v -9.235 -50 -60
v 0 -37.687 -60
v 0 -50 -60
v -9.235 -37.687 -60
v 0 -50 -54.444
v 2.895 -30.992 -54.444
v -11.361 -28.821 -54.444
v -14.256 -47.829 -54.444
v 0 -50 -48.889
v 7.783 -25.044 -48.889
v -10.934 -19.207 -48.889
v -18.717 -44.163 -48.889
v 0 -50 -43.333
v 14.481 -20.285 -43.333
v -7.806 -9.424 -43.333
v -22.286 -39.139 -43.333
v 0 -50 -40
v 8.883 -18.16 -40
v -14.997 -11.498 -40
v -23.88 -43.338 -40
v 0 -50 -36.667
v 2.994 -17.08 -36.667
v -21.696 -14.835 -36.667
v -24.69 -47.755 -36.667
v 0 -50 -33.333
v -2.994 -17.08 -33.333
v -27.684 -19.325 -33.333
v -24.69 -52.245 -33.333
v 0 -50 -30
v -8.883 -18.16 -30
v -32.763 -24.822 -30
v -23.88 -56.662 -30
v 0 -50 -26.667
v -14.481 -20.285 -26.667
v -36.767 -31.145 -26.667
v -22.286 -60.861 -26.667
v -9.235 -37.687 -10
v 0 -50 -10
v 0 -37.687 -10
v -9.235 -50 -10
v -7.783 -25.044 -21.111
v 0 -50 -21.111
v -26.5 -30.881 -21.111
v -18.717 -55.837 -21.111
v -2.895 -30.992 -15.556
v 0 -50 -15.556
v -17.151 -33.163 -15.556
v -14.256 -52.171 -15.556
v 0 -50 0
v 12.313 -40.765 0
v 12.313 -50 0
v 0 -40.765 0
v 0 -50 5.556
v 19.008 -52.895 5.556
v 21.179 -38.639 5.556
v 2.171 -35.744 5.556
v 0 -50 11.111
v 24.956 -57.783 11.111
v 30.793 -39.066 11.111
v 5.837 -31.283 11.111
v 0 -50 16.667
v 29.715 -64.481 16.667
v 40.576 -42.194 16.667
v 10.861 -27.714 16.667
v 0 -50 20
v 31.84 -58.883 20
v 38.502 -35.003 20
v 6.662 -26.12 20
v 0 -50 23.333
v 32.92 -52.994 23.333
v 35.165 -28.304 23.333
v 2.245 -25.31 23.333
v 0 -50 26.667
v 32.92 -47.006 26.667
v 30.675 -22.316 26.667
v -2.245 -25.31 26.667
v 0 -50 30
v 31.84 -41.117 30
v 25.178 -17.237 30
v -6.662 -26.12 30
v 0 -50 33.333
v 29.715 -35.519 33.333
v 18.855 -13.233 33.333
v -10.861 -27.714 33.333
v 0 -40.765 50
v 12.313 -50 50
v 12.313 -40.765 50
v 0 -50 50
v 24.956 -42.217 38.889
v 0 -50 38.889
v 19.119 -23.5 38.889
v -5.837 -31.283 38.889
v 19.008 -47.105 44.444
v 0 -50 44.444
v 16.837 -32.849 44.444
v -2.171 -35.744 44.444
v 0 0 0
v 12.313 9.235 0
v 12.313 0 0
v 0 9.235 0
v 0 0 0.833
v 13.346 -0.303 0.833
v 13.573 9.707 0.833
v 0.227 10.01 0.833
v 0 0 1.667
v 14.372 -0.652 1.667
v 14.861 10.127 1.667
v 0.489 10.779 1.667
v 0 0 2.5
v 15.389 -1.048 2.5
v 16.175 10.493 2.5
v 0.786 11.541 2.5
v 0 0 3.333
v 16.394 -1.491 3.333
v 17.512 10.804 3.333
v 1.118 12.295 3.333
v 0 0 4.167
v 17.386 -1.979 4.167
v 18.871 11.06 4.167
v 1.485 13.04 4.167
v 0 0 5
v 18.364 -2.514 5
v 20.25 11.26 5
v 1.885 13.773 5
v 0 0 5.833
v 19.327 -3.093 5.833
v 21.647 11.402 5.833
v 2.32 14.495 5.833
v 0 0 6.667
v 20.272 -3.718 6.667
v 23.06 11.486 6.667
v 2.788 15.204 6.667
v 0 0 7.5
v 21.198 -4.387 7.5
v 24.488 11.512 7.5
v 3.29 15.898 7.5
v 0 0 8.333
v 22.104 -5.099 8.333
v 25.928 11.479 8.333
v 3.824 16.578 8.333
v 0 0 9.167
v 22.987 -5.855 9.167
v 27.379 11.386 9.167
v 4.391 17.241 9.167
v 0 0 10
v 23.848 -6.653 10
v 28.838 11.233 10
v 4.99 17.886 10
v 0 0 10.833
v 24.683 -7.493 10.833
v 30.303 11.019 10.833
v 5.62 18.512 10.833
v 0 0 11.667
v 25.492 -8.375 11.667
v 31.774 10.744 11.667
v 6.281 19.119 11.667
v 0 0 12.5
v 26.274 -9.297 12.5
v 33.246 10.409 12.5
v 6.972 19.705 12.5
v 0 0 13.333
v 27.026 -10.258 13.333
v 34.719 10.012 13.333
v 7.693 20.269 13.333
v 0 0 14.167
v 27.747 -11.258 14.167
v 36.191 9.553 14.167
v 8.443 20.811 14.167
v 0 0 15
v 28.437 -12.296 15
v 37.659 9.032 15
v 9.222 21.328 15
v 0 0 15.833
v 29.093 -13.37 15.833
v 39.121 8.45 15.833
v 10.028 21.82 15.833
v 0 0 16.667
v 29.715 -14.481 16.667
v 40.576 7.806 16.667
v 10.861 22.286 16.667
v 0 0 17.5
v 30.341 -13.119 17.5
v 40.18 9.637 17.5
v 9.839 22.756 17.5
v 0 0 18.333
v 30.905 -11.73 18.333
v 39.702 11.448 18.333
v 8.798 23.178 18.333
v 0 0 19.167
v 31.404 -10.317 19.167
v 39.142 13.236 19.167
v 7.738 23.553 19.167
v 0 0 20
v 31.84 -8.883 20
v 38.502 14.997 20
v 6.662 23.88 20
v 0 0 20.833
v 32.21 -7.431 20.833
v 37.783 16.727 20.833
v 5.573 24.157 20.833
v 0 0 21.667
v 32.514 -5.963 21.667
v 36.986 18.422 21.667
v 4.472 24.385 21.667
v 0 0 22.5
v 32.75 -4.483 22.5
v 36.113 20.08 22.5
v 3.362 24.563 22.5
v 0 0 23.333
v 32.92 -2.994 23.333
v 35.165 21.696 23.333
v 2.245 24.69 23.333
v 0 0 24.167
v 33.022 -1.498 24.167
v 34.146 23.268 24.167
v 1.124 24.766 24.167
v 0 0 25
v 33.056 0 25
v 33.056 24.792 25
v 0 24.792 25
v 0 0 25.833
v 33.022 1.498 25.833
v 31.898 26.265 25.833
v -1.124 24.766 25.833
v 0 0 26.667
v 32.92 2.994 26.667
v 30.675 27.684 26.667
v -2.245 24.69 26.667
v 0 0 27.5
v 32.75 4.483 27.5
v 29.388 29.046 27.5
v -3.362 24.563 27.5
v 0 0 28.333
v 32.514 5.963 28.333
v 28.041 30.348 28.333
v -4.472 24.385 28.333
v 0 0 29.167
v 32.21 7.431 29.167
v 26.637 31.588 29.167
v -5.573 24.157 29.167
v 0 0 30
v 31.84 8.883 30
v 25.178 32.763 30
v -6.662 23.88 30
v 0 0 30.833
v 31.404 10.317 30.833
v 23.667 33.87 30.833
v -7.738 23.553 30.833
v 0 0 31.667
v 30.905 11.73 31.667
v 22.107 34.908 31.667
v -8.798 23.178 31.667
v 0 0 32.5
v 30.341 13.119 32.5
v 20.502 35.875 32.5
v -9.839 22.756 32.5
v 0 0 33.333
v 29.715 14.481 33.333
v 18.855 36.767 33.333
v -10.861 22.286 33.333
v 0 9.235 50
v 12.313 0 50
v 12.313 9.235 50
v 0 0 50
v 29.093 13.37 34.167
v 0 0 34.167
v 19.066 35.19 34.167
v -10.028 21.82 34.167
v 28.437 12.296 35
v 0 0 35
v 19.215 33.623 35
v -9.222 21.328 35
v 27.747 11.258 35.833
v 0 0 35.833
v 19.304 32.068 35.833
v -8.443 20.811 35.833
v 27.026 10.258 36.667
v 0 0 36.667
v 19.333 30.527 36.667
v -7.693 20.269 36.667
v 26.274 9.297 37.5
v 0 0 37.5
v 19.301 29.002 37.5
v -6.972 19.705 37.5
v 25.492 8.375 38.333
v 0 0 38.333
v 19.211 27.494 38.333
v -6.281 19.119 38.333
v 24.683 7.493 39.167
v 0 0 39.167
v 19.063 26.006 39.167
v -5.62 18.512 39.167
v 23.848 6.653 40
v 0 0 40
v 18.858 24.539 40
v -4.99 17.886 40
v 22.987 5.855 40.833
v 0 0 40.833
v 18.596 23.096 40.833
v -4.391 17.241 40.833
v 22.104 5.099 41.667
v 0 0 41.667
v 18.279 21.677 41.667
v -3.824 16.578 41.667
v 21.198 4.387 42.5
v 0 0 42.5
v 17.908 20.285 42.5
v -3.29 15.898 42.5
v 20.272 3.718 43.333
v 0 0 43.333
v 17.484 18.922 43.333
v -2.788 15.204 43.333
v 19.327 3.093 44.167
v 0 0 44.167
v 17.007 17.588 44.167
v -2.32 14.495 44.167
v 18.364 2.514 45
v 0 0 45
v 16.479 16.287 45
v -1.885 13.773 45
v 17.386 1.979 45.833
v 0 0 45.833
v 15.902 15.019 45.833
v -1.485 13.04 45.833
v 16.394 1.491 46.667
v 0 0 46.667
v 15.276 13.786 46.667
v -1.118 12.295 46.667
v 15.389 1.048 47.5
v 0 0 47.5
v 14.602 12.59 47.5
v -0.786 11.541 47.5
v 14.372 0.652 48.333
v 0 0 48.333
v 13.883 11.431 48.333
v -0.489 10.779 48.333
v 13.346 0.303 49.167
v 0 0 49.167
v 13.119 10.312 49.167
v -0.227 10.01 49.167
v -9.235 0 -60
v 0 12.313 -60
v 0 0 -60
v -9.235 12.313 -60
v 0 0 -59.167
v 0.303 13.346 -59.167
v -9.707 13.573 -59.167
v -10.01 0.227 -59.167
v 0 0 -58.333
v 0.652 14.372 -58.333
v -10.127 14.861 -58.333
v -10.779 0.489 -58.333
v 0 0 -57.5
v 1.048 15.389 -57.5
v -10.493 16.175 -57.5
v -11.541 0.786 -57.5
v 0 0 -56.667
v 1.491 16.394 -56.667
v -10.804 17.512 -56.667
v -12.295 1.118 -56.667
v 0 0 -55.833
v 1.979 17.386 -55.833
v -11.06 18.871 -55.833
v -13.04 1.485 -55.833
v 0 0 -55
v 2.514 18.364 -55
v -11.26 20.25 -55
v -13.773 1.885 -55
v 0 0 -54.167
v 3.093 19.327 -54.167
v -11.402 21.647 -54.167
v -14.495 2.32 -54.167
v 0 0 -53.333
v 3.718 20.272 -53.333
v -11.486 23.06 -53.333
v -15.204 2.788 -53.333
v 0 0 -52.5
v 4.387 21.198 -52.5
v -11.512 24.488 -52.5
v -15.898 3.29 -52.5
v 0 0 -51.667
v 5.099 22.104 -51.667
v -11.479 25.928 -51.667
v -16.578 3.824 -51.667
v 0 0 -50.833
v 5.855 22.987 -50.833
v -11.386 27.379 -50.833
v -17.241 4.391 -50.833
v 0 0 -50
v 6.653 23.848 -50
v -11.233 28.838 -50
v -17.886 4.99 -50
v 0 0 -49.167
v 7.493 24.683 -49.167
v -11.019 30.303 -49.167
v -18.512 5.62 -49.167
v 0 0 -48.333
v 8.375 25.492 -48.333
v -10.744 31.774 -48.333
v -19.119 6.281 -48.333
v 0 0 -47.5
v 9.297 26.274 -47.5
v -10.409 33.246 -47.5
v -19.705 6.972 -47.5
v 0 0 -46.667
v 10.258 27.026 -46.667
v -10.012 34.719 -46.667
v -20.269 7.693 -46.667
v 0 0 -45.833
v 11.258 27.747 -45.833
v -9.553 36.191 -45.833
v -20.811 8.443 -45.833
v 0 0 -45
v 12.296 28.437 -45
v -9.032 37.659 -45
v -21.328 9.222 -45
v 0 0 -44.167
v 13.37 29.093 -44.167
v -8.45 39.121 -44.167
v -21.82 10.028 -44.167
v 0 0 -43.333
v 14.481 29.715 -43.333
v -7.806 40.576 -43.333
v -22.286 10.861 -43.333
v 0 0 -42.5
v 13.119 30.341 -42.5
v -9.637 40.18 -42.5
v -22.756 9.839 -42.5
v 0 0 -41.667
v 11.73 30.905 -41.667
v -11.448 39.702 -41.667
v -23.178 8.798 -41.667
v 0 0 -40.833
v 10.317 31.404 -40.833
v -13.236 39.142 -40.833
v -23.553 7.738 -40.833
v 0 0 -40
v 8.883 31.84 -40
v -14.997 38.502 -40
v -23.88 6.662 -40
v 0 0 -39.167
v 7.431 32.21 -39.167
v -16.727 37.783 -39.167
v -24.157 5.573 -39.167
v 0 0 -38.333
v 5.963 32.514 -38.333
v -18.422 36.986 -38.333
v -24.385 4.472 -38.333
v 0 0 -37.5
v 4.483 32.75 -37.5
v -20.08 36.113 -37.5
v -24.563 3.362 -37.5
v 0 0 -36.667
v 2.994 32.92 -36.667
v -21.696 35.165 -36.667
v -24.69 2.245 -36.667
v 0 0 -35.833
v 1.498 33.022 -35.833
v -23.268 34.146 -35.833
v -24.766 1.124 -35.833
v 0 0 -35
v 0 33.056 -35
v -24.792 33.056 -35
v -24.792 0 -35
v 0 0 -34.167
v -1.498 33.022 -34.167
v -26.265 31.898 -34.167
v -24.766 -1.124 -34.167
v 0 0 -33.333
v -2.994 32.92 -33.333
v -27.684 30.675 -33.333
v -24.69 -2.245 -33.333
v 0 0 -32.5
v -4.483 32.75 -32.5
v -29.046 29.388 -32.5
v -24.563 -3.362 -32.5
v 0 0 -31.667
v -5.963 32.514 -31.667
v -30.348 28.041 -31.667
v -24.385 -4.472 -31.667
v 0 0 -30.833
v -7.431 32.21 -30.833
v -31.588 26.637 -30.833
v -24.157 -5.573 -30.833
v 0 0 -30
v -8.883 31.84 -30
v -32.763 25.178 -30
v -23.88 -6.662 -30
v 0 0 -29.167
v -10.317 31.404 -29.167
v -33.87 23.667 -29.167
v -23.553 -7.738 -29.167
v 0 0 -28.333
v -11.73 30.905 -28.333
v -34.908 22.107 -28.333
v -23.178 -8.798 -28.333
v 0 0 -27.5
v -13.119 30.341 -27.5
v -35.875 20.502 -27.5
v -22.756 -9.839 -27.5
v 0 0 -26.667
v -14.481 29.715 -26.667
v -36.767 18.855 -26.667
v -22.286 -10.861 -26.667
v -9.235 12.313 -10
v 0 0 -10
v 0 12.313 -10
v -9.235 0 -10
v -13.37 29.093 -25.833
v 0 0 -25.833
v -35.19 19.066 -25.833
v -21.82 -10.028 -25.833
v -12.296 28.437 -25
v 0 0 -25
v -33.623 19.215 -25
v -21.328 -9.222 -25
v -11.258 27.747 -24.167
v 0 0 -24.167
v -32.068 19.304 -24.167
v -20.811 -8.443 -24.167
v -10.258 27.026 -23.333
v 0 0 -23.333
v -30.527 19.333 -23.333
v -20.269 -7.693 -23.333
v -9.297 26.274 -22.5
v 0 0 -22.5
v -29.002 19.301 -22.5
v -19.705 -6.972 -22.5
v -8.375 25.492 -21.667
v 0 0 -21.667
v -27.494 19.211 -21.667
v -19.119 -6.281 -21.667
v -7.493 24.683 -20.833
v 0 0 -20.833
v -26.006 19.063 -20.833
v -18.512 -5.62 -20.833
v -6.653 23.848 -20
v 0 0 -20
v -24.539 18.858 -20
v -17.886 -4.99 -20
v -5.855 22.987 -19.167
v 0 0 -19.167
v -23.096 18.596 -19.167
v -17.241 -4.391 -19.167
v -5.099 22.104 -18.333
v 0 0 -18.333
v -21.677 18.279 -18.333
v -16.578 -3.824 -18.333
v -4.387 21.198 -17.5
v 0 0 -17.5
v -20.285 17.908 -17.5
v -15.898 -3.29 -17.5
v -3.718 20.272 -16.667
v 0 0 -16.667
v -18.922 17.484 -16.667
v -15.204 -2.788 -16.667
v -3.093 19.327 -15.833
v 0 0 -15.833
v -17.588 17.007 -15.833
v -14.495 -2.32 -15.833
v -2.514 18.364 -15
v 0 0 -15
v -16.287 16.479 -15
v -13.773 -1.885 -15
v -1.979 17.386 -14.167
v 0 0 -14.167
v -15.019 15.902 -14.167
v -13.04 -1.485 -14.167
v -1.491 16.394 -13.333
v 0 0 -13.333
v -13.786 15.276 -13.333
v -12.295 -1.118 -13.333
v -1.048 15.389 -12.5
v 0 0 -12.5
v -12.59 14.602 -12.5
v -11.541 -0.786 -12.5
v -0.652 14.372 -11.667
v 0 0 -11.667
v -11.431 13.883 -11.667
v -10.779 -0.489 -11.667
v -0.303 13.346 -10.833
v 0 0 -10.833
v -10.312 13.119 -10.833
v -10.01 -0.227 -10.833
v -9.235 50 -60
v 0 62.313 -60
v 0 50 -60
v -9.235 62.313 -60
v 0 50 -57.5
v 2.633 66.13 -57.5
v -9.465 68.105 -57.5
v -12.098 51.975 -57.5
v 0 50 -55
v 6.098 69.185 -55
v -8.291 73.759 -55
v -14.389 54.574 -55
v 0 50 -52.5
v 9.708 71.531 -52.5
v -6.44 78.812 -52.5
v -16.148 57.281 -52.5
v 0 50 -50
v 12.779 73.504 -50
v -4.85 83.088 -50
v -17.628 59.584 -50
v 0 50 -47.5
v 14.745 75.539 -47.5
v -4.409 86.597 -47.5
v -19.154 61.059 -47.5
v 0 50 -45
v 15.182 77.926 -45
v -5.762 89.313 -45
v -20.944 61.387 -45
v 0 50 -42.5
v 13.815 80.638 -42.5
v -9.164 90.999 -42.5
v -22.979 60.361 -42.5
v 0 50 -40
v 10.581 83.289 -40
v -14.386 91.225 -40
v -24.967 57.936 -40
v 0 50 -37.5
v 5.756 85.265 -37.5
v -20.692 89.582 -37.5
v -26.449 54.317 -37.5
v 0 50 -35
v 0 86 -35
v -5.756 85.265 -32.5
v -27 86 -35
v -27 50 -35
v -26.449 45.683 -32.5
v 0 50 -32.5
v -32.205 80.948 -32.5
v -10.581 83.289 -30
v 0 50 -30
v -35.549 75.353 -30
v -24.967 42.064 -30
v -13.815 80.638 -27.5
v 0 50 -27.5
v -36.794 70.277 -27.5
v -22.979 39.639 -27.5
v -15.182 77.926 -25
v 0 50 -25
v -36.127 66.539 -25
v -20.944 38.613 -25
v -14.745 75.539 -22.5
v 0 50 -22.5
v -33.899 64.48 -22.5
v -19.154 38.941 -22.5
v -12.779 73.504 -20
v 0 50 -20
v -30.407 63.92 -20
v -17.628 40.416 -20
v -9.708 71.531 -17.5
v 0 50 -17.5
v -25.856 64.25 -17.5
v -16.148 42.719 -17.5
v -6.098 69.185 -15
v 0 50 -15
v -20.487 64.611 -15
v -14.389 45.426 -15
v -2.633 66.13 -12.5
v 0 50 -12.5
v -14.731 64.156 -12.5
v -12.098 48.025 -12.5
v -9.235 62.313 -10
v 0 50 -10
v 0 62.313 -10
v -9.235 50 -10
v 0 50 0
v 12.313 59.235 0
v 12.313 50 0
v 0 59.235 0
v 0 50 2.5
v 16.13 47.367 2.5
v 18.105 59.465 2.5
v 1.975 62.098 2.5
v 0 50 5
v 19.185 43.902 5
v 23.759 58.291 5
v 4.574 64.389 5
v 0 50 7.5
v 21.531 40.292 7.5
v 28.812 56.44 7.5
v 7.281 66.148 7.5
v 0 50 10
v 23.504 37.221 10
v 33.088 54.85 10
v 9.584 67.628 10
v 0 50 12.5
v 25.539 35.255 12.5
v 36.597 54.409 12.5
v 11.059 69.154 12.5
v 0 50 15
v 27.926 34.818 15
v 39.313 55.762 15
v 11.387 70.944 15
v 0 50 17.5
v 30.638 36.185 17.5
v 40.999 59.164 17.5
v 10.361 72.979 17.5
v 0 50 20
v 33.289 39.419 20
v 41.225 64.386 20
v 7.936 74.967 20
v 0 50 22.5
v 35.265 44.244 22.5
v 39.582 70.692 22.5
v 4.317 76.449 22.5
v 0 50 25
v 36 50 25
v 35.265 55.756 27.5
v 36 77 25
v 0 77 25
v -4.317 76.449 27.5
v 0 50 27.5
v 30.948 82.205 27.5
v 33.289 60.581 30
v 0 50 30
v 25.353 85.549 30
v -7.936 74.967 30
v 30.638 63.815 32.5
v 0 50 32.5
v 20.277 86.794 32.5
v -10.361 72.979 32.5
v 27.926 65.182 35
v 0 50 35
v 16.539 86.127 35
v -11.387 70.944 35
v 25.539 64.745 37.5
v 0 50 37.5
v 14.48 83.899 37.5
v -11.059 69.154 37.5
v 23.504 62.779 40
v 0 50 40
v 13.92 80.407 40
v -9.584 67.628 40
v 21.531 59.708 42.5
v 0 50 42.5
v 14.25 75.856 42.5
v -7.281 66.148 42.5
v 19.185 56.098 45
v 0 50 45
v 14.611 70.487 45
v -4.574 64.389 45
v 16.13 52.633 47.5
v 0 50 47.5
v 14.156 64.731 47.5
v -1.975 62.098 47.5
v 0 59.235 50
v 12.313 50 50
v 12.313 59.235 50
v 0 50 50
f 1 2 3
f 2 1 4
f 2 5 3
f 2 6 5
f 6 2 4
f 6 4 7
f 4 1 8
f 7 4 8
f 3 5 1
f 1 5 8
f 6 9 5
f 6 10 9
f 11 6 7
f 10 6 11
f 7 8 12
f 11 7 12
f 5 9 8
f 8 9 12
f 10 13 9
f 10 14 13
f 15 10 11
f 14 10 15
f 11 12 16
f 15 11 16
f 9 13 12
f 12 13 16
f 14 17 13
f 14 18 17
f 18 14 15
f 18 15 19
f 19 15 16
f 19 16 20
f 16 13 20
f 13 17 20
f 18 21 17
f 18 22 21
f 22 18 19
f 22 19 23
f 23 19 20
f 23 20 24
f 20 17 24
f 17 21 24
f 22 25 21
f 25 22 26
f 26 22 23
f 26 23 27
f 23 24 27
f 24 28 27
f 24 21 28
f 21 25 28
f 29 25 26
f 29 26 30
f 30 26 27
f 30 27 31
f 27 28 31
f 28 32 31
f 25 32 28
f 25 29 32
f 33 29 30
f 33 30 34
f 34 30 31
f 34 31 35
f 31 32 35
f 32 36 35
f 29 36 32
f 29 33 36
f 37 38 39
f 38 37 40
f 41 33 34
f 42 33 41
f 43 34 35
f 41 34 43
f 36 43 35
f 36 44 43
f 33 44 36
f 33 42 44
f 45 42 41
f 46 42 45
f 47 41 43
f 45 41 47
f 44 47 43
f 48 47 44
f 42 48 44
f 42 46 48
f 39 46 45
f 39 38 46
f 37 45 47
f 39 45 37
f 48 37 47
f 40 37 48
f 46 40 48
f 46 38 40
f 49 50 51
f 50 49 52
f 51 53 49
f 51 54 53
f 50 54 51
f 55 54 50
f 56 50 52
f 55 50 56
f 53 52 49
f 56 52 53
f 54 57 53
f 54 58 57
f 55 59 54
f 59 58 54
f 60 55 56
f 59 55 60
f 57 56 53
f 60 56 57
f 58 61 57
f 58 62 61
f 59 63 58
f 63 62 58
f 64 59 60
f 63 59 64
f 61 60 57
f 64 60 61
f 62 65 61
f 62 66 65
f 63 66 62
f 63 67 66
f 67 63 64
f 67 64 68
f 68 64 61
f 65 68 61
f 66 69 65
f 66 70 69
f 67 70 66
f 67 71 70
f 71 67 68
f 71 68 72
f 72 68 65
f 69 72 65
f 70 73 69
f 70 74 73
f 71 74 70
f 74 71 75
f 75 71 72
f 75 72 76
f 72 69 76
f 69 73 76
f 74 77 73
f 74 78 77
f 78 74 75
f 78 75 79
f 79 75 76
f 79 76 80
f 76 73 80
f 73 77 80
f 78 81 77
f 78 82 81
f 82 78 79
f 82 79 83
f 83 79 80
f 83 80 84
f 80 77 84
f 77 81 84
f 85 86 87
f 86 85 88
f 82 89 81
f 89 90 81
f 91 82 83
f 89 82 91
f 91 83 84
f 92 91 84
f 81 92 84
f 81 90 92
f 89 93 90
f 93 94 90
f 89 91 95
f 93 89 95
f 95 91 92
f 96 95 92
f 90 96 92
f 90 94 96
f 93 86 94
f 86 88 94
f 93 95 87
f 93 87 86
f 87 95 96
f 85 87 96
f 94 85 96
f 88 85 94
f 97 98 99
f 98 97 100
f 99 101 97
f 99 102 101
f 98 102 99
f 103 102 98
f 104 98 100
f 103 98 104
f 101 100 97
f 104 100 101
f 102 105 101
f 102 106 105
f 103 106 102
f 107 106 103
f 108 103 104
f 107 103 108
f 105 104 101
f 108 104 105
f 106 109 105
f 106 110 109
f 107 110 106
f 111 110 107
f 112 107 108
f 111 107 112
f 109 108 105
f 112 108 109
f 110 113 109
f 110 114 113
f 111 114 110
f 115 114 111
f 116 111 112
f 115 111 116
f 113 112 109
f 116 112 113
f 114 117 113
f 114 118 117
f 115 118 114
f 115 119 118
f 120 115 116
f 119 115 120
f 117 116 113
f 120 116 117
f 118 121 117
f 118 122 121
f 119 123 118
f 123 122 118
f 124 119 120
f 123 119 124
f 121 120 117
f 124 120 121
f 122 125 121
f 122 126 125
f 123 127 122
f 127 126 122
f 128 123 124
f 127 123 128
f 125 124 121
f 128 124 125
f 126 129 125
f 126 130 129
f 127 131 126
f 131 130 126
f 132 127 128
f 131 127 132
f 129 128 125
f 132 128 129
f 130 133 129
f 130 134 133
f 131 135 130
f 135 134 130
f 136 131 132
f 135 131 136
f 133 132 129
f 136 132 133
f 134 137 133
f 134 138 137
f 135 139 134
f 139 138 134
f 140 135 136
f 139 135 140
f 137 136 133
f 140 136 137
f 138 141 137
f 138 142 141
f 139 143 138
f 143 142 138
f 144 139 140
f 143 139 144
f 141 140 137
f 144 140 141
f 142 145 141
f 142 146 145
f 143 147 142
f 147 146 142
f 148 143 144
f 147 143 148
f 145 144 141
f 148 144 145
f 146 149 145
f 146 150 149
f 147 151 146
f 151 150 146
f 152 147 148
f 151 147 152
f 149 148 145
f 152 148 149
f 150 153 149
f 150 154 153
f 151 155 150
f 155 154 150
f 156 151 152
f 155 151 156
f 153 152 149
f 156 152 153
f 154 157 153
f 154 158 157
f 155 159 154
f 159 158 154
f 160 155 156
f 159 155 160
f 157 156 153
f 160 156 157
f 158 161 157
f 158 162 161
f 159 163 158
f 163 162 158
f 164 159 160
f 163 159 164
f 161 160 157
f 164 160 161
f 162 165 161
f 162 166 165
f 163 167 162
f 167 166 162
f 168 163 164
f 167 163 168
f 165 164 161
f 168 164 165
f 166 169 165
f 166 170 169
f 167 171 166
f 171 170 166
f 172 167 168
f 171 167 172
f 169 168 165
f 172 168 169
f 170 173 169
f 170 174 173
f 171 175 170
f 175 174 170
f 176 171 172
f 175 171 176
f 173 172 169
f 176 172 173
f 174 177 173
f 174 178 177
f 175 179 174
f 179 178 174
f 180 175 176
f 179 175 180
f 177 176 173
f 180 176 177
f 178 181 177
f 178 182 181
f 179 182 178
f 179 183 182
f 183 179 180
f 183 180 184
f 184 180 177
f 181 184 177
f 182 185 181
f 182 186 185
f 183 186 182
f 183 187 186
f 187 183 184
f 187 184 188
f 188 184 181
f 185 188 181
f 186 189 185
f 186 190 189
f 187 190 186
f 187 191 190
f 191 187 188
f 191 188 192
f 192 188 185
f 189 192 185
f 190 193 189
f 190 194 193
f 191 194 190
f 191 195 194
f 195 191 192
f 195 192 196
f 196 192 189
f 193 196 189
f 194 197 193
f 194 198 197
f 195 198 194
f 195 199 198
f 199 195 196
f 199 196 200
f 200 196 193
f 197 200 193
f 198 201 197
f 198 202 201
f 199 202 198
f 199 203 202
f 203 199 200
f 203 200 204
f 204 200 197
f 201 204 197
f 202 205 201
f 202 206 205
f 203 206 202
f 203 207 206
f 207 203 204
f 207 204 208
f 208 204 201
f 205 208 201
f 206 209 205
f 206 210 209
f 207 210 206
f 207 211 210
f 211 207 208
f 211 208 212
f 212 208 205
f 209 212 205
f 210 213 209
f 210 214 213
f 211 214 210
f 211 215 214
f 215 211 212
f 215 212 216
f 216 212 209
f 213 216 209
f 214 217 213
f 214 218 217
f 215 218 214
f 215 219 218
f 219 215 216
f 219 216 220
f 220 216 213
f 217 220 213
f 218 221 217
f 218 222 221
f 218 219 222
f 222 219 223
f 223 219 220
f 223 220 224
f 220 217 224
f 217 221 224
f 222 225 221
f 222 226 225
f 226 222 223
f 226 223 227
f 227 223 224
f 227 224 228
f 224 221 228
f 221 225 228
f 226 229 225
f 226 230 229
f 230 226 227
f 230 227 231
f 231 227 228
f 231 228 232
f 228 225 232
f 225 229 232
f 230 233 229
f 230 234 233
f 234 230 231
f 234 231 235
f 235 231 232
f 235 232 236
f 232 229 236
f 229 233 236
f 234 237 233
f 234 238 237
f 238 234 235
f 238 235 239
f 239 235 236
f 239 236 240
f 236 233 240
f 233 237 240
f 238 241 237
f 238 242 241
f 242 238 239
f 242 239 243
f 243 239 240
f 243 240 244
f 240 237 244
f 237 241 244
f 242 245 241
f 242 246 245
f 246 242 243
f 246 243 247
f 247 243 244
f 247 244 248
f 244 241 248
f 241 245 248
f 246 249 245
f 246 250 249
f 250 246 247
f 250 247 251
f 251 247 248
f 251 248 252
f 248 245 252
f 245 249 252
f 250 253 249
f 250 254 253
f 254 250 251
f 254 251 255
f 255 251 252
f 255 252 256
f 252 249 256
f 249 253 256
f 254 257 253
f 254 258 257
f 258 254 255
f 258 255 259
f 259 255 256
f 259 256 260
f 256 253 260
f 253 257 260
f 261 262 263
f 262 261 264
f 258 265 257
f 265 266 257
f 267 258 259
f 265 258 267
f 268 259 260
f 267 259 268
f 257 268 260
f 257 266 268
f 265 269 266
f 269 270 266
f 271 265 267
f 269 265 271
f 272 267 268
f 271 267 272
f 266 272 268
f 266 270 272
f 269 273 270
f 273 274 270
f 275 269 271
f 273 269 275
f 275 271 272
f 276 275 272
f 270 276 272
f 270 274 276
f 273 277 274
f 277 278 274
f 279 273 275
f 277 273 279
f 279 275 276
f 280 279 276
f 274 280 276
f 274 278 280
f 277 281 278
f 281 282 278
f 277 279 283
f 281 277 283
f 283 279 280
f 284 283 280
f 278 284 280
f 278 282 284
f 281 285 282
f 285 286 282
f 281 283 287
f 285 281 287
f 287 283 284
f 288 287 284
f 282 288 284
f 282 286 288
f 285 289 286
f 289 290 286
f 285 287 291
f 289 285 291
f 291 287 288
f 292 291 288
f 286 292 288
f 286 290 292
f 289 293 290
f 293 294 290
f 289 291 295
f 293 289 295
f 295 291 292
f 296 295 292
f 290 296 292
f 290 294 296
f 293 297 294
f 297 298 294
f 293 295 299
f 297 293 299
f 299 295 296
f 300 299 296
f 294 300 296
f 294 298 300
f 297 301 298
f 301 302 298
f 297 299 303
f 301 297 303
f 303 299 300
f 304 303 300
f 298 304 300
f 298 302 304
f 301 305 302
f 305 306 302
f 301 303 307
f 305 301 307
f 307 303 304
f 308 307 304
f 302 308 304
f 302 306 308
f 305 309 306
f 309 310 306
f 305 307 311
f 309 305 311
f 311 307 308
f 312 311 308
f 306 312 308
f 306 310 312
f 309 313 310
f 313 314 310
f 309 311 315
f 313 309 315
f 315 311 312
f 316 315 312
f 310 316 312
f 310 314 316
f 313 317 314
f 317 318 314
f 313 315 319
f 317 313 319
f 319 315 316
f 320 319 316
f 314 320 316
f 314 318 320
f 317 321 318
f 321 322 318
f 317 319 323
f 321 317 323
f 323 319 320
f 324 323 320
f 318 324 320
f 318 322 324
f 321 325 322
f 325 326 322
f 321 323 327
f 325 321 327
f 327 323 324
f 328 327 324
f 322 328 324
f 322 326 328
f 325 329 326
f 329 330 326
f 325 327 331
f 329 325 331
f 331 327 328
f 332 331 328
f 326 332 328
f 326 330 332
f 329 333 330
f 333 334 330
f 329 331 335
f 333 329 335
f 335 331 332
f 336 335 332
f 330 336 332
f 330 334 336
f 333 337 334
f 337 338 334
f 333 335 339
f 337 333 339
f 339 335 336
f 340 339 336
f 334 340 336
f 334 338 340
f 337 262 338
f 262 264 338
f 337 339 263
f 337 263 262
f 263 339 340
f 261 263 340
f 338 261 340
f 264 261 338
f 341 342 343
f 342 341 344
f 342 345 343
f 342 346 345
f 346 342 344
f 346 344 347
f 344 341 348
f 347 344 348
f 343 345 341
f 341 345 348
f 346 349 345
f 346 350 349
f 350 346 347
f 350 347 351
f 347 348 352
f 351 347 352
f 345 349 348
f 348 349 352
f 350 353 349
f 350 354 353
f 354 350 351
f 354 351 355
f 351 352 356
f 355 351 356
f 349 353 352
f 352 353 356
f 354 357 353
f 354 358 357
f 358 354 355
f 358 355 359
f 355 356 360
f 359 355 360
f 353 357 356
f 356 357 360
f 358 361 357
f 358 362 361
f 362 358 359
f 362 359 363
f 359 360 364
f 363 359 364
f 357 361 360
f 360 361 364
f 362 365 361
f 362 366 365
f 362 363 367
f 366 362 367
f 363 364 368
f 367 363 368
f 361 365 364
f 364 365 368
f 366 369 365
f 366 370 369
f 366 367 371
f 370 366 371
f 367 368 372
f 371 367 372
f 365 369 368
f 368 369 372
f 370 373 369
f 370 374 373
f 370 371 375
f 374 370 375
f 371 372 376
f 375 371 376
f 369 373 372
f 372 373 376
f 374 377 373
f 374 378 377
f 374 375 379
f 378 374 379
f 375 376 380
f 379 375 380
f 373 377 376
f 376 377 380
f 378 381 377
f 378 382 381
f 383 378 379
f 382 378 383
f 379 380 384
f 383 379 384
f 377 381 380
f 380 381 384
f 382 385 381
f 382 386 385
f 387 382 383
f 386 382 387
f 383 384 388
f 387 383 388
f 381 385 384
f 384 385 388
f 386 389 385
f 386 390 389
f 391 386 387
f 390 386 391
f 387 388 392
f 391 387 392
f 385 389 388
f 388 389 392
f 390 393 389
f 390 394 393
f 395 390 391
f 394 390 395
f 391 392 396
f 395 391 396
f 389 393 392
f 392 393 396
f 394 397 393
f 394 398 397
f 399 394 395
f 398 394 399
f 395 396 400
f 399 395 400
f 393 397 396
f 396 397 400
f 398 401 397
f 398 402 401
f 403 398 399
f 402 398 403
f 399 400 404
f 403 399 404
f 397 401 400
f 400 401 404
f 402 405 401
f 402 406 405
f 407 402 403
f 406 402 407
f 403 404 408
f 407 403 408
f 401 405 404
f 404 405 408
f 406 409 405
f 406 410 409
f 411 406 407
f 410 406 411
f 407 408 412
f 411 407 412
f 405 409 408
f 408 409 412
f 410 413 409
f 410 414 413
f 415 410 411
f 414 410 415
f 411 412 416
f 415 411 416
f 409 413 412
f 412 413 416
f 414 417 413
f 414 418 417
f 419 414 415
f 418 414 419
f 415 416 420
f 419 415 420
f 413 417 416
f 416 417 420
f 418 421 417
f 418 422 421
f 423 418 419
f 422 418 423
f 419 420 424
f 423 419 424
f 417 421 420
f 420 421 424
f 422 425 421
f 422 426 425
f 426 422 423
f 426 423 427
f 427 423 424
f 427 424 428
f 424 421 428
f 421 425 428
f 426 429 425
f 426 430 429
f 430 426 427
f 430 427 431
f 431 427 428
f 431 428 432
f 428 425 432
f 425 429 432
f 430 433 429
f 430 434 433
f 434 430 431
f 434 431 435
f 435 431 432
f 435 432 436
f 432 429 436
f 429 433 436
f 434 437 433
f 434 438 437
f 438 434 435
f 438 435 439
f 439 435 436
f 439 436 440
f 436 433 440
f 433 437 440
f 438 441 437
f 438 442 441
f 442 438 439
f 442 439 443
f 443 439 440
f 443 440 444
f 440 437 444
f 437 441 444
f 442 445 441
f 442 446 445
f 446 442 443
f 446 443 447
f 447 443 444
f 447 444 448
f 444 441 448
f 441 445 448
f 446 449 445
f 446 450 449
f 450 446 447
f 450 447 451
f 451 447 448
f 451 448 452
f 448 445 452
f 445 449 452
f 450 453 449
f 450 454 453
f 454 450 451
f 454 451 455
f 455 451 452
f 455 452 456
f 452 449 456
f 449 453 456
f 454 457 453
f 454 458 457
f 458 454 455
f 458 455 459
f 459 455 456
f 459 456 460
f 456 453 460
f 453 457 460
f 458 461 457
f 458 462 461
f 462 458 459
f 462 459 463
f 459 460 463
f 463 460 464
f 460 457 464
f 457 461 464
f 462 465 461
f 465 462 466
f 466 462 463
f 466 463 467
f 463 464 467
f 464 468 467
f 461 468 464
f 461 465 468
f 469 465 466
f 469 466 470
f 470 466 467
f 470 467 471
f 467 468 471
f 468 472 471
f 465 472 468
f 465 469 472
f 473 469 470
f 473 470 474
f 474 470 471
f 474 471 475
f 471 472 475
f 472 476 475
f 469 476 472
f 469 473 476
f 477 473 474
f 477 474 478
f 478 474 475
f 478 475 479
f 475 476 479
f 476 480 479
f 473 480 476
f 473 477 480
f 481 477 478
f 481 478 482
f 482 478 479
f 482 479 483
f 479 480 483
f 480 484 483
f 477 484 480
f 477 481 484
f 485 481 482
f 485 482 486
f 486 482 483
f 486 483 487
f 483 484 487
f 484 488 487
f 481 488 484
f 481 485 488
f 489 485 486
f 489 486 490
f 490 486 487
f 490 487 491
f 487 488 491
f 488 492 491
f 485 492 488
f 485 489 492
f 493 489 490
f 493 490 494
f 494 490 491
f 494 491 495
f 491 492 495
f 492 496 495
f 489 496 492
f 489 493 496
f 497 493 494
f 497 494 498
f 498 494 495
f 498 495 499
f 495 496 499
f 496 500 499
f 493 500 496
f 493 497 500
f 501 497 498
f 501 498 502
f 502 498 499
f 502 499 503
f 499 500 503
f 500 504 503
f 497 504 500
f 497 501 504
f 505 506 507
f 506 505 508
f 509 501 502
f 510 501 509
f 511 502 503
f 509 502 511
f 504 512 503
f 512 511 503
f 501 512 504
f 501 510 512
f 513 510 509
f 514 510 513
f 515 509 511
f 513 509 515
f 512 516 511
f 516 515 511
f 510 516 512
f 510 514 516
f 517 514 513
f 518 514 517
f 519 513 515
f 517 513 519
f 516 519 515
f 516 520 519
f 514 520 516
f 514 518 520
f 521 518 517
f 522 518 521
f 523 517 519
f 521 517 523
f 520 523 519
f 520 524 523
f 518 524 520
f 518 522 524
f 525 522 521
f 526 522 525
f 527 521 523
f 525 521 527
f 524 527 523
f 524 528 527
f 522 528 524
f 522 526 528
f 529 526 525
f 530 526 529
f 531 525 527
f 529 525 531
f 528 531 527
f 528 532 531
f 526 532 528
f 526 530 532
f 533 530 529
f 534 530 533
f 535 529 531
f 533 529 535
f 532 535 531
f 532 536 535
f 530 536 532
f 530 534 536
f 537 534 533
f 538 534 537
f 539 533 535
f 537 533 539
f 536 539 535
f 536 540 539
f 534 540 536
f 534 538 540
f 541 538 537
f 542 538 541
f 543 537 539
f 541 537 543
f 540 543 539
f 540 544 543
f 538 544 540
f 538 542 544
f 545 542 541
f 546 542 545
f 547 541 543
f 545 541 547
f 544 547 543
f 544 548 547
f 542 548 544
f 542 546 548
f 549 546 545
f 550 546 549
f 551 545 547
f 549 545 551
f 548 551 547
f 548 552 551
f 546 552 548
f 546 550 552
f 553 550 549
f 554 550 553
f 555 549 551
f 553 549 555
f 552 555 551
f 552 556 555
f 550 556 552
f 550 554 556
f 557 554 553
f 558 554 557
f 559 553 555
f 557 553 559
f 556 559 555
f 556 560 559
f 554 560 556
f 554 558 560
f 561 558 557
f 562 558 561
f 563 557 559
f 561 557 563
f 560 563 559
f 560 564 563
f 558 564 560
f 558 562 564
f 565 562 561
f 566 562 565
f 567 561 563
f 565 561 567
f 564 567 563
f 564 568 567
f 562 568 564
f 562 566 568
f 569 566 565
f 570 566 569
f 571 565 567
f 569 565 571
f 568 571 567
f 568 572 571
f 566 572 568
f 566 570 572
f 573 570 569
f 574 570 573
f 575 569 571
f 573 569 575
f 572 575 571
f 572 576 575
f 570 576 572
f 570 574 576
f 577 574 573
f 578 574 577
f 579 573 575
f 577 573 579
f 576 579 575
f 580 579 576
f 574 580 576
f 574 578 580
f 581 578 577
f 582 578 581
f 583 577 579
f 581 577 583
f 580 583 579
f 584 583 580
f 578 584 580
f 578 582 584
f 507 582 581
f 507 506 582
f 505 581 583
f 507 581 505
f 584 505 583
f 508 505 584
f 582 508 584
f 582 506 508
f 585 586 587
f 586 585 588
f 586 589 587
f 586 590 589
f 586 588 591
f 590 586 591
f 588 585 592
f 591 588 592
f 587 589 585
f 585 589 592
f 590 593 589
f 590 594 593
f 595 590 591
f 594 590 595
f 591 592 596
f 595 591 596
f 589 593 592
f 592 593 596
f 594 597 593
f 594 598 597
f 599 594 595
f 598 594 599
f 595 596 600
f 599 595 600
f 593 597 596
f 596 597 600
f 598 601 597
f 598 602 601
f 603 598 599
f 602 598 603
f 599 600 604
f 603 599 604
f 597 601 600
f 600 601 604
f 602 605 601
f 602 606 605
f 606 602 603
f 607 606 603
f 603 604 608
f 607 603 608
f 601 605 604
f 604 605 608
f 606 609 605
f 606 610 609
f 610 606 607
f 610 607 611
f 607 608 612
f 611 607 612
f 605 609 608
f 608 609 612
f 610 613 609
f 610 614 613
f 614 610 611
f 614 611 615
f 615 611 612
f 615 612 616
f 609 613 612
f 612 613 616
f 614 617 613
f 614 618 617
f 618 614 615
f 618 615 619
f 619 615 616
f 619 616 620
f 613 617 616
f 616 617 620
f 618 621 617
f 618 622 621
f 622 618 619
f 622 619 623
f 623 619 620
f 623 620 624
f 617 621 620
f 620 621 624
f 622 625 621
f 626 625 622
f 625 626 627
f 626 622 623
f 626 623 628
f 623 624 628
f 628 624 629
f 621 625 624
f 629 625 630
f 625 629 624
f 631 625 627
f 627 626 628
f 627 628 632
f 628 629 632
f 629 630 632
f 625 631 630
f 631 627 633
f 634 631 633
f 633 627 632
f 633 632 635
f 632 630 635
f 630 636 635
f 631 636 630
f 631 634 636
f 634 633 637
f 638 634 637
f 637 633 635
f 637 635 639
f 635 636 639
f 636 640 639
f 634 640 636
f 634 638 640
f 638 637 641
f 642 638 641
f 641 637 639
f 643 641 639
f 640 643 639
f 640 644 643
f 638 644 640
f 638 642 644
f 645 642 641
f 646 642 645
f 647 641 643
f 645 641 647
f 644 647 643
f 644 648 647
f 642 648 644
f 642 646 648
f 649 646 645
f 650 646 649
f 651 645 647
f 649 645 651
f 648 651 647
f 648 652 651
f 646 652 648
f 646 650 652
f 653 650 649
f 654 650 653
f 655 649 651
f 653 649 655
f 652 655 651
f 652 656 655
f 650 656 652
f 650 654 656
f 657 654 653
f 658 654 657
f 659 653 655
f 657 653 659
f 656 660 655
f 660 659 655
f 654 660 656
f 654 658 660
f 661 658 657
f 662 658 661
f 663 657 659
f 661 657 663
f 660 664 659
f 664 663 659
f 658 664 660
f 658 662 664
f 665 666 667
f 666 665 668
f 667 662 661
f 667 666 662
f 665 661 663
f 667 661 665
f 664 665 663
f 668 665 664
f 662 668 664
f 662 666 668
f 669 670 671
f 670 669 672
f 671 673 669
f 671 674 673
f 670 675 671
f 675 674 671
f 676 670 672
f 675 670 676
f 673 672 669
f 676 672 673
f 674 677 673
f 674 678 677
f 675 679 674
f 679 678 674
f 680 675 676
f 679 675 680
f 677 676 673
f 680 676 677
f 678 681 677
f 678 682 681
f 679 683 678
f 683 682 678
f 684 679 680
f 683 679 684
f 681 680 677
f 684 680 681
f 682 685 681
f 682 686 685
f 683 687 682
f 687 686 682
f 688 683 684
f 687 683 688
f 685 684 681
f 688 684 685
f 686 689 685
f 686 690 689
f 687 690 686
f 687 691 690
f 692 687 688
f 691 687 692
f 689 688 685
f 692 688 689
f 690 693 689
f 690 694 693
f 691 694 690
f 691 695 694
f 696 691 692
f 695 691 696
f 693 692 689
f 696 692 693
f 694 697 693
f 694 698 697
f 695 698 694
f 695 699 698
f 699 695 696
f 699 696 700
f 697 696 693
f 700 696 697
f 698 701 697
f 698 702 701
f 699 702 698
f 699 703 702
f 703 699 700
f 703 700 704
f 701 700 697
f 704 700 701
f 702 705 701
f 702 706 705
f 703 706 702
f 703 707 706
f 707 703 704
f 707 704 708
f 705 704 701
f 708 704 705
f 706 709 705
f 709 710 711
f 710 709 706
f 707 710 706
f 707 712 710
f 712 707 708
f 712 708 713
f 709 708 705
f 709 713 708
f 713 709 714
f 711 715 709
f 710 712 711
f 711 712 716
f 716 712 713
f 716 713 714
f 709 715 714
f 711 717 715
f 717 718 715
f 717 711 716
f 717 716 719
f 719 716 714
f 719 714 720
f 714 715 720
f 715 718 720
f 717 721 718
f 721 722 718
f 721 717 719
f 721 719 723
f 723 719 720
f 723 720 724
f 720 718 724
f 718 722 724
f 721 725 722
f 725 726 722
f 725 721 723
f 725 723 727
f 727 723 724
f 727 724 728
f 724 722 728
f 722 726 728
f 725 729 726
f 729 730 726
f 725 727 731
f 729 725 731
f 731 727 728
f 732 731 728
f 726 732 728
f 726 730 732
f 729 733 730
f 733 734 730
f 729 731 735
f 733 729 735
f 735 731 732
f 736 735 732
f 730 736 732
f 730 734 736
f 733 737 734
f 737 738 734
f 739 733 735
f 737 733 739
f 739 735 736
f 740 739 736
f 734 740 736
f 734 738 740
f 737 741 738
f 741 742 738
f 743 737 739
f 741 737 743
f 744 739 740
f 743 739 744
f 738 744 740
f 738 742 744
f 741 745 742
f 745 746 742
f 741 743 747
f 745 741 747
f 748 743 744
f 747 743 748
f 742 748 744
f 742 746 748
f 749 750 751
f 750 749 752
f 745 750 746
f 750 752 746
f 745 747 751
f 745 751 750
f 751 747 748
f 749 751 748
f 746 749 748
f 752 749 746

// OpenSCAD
//Linear Extrude with Twist and Scale as interpolated functions
// This module does not need to be modified,
// - unless default parameters want to be changed
// - or additional parameters want to be forwarded
module linear_extrude_ftfs(height=1,isteps=20,slices=0){
  //union of piecewise generated extrudes
  union(){
   for(i=[0:1:isteps-1]){
    translate([0,0,i*height/isteps])
     linear_extrude(
      height=height/isteps,
      twist=leftfs_ftw((i+1)/isteps)-leftfs_ftw(i/isteps),
      scale=leftfs_fsc((i+1)/isteps)/leftfs_fsc(i/isteps),
      slices=slices
     )
      rotate([0,0,-leftfs_ftw(i/isteps)])
       scale(leftfs_fsc(i/isteps))
        obj2D_leftfs();
   }
  }
}
// This function defines the scale function
// - Function name must not be modified
// - Modify the contents/return value to define the function
function leftfs_fsc(x)=
  let(scale=3,span=140,start=20)
  scale*sin(x*span+start);
// This function defines the twist function
// - Function name must not be modified
// - Modify the contents/return value to define the function
function leftfs_ftw(x)=
  let(twist=30,span=360,start=0)
  twist*sin(x*span+start);
// This module defines the base 2D object to be extruded
// - Function name must not be modified
// - Modify the contents to define the base 2D object
module obj2D_leftfs(){
   square([12,9]);
}
//Left rendered objects demonstrating the steps effect
translate([0,-50,-60])
rotate([0,0,90])
linear_extrude_ftfs(height=50,isteps=3);

translate([0,-50,0])
linear_extrude_ftfs(height=50,isteps=3);
//Center rendered objects demonstrating the slices effect
translate([0,0,-60])
rotate([0,0,90])
linear_extrude_ftfs(height=50,isteps=3,slices=20);

linear_extrude_ftfs(height=50,isteps=3,slices=20);
//Right rendered objects with default parameters
translate([0,50,-60])
rotate([0,0,90])
linear_extrude_ftfs(height=50);

translate([0,50,0])
linear_extrude_ftfs(height=50);
